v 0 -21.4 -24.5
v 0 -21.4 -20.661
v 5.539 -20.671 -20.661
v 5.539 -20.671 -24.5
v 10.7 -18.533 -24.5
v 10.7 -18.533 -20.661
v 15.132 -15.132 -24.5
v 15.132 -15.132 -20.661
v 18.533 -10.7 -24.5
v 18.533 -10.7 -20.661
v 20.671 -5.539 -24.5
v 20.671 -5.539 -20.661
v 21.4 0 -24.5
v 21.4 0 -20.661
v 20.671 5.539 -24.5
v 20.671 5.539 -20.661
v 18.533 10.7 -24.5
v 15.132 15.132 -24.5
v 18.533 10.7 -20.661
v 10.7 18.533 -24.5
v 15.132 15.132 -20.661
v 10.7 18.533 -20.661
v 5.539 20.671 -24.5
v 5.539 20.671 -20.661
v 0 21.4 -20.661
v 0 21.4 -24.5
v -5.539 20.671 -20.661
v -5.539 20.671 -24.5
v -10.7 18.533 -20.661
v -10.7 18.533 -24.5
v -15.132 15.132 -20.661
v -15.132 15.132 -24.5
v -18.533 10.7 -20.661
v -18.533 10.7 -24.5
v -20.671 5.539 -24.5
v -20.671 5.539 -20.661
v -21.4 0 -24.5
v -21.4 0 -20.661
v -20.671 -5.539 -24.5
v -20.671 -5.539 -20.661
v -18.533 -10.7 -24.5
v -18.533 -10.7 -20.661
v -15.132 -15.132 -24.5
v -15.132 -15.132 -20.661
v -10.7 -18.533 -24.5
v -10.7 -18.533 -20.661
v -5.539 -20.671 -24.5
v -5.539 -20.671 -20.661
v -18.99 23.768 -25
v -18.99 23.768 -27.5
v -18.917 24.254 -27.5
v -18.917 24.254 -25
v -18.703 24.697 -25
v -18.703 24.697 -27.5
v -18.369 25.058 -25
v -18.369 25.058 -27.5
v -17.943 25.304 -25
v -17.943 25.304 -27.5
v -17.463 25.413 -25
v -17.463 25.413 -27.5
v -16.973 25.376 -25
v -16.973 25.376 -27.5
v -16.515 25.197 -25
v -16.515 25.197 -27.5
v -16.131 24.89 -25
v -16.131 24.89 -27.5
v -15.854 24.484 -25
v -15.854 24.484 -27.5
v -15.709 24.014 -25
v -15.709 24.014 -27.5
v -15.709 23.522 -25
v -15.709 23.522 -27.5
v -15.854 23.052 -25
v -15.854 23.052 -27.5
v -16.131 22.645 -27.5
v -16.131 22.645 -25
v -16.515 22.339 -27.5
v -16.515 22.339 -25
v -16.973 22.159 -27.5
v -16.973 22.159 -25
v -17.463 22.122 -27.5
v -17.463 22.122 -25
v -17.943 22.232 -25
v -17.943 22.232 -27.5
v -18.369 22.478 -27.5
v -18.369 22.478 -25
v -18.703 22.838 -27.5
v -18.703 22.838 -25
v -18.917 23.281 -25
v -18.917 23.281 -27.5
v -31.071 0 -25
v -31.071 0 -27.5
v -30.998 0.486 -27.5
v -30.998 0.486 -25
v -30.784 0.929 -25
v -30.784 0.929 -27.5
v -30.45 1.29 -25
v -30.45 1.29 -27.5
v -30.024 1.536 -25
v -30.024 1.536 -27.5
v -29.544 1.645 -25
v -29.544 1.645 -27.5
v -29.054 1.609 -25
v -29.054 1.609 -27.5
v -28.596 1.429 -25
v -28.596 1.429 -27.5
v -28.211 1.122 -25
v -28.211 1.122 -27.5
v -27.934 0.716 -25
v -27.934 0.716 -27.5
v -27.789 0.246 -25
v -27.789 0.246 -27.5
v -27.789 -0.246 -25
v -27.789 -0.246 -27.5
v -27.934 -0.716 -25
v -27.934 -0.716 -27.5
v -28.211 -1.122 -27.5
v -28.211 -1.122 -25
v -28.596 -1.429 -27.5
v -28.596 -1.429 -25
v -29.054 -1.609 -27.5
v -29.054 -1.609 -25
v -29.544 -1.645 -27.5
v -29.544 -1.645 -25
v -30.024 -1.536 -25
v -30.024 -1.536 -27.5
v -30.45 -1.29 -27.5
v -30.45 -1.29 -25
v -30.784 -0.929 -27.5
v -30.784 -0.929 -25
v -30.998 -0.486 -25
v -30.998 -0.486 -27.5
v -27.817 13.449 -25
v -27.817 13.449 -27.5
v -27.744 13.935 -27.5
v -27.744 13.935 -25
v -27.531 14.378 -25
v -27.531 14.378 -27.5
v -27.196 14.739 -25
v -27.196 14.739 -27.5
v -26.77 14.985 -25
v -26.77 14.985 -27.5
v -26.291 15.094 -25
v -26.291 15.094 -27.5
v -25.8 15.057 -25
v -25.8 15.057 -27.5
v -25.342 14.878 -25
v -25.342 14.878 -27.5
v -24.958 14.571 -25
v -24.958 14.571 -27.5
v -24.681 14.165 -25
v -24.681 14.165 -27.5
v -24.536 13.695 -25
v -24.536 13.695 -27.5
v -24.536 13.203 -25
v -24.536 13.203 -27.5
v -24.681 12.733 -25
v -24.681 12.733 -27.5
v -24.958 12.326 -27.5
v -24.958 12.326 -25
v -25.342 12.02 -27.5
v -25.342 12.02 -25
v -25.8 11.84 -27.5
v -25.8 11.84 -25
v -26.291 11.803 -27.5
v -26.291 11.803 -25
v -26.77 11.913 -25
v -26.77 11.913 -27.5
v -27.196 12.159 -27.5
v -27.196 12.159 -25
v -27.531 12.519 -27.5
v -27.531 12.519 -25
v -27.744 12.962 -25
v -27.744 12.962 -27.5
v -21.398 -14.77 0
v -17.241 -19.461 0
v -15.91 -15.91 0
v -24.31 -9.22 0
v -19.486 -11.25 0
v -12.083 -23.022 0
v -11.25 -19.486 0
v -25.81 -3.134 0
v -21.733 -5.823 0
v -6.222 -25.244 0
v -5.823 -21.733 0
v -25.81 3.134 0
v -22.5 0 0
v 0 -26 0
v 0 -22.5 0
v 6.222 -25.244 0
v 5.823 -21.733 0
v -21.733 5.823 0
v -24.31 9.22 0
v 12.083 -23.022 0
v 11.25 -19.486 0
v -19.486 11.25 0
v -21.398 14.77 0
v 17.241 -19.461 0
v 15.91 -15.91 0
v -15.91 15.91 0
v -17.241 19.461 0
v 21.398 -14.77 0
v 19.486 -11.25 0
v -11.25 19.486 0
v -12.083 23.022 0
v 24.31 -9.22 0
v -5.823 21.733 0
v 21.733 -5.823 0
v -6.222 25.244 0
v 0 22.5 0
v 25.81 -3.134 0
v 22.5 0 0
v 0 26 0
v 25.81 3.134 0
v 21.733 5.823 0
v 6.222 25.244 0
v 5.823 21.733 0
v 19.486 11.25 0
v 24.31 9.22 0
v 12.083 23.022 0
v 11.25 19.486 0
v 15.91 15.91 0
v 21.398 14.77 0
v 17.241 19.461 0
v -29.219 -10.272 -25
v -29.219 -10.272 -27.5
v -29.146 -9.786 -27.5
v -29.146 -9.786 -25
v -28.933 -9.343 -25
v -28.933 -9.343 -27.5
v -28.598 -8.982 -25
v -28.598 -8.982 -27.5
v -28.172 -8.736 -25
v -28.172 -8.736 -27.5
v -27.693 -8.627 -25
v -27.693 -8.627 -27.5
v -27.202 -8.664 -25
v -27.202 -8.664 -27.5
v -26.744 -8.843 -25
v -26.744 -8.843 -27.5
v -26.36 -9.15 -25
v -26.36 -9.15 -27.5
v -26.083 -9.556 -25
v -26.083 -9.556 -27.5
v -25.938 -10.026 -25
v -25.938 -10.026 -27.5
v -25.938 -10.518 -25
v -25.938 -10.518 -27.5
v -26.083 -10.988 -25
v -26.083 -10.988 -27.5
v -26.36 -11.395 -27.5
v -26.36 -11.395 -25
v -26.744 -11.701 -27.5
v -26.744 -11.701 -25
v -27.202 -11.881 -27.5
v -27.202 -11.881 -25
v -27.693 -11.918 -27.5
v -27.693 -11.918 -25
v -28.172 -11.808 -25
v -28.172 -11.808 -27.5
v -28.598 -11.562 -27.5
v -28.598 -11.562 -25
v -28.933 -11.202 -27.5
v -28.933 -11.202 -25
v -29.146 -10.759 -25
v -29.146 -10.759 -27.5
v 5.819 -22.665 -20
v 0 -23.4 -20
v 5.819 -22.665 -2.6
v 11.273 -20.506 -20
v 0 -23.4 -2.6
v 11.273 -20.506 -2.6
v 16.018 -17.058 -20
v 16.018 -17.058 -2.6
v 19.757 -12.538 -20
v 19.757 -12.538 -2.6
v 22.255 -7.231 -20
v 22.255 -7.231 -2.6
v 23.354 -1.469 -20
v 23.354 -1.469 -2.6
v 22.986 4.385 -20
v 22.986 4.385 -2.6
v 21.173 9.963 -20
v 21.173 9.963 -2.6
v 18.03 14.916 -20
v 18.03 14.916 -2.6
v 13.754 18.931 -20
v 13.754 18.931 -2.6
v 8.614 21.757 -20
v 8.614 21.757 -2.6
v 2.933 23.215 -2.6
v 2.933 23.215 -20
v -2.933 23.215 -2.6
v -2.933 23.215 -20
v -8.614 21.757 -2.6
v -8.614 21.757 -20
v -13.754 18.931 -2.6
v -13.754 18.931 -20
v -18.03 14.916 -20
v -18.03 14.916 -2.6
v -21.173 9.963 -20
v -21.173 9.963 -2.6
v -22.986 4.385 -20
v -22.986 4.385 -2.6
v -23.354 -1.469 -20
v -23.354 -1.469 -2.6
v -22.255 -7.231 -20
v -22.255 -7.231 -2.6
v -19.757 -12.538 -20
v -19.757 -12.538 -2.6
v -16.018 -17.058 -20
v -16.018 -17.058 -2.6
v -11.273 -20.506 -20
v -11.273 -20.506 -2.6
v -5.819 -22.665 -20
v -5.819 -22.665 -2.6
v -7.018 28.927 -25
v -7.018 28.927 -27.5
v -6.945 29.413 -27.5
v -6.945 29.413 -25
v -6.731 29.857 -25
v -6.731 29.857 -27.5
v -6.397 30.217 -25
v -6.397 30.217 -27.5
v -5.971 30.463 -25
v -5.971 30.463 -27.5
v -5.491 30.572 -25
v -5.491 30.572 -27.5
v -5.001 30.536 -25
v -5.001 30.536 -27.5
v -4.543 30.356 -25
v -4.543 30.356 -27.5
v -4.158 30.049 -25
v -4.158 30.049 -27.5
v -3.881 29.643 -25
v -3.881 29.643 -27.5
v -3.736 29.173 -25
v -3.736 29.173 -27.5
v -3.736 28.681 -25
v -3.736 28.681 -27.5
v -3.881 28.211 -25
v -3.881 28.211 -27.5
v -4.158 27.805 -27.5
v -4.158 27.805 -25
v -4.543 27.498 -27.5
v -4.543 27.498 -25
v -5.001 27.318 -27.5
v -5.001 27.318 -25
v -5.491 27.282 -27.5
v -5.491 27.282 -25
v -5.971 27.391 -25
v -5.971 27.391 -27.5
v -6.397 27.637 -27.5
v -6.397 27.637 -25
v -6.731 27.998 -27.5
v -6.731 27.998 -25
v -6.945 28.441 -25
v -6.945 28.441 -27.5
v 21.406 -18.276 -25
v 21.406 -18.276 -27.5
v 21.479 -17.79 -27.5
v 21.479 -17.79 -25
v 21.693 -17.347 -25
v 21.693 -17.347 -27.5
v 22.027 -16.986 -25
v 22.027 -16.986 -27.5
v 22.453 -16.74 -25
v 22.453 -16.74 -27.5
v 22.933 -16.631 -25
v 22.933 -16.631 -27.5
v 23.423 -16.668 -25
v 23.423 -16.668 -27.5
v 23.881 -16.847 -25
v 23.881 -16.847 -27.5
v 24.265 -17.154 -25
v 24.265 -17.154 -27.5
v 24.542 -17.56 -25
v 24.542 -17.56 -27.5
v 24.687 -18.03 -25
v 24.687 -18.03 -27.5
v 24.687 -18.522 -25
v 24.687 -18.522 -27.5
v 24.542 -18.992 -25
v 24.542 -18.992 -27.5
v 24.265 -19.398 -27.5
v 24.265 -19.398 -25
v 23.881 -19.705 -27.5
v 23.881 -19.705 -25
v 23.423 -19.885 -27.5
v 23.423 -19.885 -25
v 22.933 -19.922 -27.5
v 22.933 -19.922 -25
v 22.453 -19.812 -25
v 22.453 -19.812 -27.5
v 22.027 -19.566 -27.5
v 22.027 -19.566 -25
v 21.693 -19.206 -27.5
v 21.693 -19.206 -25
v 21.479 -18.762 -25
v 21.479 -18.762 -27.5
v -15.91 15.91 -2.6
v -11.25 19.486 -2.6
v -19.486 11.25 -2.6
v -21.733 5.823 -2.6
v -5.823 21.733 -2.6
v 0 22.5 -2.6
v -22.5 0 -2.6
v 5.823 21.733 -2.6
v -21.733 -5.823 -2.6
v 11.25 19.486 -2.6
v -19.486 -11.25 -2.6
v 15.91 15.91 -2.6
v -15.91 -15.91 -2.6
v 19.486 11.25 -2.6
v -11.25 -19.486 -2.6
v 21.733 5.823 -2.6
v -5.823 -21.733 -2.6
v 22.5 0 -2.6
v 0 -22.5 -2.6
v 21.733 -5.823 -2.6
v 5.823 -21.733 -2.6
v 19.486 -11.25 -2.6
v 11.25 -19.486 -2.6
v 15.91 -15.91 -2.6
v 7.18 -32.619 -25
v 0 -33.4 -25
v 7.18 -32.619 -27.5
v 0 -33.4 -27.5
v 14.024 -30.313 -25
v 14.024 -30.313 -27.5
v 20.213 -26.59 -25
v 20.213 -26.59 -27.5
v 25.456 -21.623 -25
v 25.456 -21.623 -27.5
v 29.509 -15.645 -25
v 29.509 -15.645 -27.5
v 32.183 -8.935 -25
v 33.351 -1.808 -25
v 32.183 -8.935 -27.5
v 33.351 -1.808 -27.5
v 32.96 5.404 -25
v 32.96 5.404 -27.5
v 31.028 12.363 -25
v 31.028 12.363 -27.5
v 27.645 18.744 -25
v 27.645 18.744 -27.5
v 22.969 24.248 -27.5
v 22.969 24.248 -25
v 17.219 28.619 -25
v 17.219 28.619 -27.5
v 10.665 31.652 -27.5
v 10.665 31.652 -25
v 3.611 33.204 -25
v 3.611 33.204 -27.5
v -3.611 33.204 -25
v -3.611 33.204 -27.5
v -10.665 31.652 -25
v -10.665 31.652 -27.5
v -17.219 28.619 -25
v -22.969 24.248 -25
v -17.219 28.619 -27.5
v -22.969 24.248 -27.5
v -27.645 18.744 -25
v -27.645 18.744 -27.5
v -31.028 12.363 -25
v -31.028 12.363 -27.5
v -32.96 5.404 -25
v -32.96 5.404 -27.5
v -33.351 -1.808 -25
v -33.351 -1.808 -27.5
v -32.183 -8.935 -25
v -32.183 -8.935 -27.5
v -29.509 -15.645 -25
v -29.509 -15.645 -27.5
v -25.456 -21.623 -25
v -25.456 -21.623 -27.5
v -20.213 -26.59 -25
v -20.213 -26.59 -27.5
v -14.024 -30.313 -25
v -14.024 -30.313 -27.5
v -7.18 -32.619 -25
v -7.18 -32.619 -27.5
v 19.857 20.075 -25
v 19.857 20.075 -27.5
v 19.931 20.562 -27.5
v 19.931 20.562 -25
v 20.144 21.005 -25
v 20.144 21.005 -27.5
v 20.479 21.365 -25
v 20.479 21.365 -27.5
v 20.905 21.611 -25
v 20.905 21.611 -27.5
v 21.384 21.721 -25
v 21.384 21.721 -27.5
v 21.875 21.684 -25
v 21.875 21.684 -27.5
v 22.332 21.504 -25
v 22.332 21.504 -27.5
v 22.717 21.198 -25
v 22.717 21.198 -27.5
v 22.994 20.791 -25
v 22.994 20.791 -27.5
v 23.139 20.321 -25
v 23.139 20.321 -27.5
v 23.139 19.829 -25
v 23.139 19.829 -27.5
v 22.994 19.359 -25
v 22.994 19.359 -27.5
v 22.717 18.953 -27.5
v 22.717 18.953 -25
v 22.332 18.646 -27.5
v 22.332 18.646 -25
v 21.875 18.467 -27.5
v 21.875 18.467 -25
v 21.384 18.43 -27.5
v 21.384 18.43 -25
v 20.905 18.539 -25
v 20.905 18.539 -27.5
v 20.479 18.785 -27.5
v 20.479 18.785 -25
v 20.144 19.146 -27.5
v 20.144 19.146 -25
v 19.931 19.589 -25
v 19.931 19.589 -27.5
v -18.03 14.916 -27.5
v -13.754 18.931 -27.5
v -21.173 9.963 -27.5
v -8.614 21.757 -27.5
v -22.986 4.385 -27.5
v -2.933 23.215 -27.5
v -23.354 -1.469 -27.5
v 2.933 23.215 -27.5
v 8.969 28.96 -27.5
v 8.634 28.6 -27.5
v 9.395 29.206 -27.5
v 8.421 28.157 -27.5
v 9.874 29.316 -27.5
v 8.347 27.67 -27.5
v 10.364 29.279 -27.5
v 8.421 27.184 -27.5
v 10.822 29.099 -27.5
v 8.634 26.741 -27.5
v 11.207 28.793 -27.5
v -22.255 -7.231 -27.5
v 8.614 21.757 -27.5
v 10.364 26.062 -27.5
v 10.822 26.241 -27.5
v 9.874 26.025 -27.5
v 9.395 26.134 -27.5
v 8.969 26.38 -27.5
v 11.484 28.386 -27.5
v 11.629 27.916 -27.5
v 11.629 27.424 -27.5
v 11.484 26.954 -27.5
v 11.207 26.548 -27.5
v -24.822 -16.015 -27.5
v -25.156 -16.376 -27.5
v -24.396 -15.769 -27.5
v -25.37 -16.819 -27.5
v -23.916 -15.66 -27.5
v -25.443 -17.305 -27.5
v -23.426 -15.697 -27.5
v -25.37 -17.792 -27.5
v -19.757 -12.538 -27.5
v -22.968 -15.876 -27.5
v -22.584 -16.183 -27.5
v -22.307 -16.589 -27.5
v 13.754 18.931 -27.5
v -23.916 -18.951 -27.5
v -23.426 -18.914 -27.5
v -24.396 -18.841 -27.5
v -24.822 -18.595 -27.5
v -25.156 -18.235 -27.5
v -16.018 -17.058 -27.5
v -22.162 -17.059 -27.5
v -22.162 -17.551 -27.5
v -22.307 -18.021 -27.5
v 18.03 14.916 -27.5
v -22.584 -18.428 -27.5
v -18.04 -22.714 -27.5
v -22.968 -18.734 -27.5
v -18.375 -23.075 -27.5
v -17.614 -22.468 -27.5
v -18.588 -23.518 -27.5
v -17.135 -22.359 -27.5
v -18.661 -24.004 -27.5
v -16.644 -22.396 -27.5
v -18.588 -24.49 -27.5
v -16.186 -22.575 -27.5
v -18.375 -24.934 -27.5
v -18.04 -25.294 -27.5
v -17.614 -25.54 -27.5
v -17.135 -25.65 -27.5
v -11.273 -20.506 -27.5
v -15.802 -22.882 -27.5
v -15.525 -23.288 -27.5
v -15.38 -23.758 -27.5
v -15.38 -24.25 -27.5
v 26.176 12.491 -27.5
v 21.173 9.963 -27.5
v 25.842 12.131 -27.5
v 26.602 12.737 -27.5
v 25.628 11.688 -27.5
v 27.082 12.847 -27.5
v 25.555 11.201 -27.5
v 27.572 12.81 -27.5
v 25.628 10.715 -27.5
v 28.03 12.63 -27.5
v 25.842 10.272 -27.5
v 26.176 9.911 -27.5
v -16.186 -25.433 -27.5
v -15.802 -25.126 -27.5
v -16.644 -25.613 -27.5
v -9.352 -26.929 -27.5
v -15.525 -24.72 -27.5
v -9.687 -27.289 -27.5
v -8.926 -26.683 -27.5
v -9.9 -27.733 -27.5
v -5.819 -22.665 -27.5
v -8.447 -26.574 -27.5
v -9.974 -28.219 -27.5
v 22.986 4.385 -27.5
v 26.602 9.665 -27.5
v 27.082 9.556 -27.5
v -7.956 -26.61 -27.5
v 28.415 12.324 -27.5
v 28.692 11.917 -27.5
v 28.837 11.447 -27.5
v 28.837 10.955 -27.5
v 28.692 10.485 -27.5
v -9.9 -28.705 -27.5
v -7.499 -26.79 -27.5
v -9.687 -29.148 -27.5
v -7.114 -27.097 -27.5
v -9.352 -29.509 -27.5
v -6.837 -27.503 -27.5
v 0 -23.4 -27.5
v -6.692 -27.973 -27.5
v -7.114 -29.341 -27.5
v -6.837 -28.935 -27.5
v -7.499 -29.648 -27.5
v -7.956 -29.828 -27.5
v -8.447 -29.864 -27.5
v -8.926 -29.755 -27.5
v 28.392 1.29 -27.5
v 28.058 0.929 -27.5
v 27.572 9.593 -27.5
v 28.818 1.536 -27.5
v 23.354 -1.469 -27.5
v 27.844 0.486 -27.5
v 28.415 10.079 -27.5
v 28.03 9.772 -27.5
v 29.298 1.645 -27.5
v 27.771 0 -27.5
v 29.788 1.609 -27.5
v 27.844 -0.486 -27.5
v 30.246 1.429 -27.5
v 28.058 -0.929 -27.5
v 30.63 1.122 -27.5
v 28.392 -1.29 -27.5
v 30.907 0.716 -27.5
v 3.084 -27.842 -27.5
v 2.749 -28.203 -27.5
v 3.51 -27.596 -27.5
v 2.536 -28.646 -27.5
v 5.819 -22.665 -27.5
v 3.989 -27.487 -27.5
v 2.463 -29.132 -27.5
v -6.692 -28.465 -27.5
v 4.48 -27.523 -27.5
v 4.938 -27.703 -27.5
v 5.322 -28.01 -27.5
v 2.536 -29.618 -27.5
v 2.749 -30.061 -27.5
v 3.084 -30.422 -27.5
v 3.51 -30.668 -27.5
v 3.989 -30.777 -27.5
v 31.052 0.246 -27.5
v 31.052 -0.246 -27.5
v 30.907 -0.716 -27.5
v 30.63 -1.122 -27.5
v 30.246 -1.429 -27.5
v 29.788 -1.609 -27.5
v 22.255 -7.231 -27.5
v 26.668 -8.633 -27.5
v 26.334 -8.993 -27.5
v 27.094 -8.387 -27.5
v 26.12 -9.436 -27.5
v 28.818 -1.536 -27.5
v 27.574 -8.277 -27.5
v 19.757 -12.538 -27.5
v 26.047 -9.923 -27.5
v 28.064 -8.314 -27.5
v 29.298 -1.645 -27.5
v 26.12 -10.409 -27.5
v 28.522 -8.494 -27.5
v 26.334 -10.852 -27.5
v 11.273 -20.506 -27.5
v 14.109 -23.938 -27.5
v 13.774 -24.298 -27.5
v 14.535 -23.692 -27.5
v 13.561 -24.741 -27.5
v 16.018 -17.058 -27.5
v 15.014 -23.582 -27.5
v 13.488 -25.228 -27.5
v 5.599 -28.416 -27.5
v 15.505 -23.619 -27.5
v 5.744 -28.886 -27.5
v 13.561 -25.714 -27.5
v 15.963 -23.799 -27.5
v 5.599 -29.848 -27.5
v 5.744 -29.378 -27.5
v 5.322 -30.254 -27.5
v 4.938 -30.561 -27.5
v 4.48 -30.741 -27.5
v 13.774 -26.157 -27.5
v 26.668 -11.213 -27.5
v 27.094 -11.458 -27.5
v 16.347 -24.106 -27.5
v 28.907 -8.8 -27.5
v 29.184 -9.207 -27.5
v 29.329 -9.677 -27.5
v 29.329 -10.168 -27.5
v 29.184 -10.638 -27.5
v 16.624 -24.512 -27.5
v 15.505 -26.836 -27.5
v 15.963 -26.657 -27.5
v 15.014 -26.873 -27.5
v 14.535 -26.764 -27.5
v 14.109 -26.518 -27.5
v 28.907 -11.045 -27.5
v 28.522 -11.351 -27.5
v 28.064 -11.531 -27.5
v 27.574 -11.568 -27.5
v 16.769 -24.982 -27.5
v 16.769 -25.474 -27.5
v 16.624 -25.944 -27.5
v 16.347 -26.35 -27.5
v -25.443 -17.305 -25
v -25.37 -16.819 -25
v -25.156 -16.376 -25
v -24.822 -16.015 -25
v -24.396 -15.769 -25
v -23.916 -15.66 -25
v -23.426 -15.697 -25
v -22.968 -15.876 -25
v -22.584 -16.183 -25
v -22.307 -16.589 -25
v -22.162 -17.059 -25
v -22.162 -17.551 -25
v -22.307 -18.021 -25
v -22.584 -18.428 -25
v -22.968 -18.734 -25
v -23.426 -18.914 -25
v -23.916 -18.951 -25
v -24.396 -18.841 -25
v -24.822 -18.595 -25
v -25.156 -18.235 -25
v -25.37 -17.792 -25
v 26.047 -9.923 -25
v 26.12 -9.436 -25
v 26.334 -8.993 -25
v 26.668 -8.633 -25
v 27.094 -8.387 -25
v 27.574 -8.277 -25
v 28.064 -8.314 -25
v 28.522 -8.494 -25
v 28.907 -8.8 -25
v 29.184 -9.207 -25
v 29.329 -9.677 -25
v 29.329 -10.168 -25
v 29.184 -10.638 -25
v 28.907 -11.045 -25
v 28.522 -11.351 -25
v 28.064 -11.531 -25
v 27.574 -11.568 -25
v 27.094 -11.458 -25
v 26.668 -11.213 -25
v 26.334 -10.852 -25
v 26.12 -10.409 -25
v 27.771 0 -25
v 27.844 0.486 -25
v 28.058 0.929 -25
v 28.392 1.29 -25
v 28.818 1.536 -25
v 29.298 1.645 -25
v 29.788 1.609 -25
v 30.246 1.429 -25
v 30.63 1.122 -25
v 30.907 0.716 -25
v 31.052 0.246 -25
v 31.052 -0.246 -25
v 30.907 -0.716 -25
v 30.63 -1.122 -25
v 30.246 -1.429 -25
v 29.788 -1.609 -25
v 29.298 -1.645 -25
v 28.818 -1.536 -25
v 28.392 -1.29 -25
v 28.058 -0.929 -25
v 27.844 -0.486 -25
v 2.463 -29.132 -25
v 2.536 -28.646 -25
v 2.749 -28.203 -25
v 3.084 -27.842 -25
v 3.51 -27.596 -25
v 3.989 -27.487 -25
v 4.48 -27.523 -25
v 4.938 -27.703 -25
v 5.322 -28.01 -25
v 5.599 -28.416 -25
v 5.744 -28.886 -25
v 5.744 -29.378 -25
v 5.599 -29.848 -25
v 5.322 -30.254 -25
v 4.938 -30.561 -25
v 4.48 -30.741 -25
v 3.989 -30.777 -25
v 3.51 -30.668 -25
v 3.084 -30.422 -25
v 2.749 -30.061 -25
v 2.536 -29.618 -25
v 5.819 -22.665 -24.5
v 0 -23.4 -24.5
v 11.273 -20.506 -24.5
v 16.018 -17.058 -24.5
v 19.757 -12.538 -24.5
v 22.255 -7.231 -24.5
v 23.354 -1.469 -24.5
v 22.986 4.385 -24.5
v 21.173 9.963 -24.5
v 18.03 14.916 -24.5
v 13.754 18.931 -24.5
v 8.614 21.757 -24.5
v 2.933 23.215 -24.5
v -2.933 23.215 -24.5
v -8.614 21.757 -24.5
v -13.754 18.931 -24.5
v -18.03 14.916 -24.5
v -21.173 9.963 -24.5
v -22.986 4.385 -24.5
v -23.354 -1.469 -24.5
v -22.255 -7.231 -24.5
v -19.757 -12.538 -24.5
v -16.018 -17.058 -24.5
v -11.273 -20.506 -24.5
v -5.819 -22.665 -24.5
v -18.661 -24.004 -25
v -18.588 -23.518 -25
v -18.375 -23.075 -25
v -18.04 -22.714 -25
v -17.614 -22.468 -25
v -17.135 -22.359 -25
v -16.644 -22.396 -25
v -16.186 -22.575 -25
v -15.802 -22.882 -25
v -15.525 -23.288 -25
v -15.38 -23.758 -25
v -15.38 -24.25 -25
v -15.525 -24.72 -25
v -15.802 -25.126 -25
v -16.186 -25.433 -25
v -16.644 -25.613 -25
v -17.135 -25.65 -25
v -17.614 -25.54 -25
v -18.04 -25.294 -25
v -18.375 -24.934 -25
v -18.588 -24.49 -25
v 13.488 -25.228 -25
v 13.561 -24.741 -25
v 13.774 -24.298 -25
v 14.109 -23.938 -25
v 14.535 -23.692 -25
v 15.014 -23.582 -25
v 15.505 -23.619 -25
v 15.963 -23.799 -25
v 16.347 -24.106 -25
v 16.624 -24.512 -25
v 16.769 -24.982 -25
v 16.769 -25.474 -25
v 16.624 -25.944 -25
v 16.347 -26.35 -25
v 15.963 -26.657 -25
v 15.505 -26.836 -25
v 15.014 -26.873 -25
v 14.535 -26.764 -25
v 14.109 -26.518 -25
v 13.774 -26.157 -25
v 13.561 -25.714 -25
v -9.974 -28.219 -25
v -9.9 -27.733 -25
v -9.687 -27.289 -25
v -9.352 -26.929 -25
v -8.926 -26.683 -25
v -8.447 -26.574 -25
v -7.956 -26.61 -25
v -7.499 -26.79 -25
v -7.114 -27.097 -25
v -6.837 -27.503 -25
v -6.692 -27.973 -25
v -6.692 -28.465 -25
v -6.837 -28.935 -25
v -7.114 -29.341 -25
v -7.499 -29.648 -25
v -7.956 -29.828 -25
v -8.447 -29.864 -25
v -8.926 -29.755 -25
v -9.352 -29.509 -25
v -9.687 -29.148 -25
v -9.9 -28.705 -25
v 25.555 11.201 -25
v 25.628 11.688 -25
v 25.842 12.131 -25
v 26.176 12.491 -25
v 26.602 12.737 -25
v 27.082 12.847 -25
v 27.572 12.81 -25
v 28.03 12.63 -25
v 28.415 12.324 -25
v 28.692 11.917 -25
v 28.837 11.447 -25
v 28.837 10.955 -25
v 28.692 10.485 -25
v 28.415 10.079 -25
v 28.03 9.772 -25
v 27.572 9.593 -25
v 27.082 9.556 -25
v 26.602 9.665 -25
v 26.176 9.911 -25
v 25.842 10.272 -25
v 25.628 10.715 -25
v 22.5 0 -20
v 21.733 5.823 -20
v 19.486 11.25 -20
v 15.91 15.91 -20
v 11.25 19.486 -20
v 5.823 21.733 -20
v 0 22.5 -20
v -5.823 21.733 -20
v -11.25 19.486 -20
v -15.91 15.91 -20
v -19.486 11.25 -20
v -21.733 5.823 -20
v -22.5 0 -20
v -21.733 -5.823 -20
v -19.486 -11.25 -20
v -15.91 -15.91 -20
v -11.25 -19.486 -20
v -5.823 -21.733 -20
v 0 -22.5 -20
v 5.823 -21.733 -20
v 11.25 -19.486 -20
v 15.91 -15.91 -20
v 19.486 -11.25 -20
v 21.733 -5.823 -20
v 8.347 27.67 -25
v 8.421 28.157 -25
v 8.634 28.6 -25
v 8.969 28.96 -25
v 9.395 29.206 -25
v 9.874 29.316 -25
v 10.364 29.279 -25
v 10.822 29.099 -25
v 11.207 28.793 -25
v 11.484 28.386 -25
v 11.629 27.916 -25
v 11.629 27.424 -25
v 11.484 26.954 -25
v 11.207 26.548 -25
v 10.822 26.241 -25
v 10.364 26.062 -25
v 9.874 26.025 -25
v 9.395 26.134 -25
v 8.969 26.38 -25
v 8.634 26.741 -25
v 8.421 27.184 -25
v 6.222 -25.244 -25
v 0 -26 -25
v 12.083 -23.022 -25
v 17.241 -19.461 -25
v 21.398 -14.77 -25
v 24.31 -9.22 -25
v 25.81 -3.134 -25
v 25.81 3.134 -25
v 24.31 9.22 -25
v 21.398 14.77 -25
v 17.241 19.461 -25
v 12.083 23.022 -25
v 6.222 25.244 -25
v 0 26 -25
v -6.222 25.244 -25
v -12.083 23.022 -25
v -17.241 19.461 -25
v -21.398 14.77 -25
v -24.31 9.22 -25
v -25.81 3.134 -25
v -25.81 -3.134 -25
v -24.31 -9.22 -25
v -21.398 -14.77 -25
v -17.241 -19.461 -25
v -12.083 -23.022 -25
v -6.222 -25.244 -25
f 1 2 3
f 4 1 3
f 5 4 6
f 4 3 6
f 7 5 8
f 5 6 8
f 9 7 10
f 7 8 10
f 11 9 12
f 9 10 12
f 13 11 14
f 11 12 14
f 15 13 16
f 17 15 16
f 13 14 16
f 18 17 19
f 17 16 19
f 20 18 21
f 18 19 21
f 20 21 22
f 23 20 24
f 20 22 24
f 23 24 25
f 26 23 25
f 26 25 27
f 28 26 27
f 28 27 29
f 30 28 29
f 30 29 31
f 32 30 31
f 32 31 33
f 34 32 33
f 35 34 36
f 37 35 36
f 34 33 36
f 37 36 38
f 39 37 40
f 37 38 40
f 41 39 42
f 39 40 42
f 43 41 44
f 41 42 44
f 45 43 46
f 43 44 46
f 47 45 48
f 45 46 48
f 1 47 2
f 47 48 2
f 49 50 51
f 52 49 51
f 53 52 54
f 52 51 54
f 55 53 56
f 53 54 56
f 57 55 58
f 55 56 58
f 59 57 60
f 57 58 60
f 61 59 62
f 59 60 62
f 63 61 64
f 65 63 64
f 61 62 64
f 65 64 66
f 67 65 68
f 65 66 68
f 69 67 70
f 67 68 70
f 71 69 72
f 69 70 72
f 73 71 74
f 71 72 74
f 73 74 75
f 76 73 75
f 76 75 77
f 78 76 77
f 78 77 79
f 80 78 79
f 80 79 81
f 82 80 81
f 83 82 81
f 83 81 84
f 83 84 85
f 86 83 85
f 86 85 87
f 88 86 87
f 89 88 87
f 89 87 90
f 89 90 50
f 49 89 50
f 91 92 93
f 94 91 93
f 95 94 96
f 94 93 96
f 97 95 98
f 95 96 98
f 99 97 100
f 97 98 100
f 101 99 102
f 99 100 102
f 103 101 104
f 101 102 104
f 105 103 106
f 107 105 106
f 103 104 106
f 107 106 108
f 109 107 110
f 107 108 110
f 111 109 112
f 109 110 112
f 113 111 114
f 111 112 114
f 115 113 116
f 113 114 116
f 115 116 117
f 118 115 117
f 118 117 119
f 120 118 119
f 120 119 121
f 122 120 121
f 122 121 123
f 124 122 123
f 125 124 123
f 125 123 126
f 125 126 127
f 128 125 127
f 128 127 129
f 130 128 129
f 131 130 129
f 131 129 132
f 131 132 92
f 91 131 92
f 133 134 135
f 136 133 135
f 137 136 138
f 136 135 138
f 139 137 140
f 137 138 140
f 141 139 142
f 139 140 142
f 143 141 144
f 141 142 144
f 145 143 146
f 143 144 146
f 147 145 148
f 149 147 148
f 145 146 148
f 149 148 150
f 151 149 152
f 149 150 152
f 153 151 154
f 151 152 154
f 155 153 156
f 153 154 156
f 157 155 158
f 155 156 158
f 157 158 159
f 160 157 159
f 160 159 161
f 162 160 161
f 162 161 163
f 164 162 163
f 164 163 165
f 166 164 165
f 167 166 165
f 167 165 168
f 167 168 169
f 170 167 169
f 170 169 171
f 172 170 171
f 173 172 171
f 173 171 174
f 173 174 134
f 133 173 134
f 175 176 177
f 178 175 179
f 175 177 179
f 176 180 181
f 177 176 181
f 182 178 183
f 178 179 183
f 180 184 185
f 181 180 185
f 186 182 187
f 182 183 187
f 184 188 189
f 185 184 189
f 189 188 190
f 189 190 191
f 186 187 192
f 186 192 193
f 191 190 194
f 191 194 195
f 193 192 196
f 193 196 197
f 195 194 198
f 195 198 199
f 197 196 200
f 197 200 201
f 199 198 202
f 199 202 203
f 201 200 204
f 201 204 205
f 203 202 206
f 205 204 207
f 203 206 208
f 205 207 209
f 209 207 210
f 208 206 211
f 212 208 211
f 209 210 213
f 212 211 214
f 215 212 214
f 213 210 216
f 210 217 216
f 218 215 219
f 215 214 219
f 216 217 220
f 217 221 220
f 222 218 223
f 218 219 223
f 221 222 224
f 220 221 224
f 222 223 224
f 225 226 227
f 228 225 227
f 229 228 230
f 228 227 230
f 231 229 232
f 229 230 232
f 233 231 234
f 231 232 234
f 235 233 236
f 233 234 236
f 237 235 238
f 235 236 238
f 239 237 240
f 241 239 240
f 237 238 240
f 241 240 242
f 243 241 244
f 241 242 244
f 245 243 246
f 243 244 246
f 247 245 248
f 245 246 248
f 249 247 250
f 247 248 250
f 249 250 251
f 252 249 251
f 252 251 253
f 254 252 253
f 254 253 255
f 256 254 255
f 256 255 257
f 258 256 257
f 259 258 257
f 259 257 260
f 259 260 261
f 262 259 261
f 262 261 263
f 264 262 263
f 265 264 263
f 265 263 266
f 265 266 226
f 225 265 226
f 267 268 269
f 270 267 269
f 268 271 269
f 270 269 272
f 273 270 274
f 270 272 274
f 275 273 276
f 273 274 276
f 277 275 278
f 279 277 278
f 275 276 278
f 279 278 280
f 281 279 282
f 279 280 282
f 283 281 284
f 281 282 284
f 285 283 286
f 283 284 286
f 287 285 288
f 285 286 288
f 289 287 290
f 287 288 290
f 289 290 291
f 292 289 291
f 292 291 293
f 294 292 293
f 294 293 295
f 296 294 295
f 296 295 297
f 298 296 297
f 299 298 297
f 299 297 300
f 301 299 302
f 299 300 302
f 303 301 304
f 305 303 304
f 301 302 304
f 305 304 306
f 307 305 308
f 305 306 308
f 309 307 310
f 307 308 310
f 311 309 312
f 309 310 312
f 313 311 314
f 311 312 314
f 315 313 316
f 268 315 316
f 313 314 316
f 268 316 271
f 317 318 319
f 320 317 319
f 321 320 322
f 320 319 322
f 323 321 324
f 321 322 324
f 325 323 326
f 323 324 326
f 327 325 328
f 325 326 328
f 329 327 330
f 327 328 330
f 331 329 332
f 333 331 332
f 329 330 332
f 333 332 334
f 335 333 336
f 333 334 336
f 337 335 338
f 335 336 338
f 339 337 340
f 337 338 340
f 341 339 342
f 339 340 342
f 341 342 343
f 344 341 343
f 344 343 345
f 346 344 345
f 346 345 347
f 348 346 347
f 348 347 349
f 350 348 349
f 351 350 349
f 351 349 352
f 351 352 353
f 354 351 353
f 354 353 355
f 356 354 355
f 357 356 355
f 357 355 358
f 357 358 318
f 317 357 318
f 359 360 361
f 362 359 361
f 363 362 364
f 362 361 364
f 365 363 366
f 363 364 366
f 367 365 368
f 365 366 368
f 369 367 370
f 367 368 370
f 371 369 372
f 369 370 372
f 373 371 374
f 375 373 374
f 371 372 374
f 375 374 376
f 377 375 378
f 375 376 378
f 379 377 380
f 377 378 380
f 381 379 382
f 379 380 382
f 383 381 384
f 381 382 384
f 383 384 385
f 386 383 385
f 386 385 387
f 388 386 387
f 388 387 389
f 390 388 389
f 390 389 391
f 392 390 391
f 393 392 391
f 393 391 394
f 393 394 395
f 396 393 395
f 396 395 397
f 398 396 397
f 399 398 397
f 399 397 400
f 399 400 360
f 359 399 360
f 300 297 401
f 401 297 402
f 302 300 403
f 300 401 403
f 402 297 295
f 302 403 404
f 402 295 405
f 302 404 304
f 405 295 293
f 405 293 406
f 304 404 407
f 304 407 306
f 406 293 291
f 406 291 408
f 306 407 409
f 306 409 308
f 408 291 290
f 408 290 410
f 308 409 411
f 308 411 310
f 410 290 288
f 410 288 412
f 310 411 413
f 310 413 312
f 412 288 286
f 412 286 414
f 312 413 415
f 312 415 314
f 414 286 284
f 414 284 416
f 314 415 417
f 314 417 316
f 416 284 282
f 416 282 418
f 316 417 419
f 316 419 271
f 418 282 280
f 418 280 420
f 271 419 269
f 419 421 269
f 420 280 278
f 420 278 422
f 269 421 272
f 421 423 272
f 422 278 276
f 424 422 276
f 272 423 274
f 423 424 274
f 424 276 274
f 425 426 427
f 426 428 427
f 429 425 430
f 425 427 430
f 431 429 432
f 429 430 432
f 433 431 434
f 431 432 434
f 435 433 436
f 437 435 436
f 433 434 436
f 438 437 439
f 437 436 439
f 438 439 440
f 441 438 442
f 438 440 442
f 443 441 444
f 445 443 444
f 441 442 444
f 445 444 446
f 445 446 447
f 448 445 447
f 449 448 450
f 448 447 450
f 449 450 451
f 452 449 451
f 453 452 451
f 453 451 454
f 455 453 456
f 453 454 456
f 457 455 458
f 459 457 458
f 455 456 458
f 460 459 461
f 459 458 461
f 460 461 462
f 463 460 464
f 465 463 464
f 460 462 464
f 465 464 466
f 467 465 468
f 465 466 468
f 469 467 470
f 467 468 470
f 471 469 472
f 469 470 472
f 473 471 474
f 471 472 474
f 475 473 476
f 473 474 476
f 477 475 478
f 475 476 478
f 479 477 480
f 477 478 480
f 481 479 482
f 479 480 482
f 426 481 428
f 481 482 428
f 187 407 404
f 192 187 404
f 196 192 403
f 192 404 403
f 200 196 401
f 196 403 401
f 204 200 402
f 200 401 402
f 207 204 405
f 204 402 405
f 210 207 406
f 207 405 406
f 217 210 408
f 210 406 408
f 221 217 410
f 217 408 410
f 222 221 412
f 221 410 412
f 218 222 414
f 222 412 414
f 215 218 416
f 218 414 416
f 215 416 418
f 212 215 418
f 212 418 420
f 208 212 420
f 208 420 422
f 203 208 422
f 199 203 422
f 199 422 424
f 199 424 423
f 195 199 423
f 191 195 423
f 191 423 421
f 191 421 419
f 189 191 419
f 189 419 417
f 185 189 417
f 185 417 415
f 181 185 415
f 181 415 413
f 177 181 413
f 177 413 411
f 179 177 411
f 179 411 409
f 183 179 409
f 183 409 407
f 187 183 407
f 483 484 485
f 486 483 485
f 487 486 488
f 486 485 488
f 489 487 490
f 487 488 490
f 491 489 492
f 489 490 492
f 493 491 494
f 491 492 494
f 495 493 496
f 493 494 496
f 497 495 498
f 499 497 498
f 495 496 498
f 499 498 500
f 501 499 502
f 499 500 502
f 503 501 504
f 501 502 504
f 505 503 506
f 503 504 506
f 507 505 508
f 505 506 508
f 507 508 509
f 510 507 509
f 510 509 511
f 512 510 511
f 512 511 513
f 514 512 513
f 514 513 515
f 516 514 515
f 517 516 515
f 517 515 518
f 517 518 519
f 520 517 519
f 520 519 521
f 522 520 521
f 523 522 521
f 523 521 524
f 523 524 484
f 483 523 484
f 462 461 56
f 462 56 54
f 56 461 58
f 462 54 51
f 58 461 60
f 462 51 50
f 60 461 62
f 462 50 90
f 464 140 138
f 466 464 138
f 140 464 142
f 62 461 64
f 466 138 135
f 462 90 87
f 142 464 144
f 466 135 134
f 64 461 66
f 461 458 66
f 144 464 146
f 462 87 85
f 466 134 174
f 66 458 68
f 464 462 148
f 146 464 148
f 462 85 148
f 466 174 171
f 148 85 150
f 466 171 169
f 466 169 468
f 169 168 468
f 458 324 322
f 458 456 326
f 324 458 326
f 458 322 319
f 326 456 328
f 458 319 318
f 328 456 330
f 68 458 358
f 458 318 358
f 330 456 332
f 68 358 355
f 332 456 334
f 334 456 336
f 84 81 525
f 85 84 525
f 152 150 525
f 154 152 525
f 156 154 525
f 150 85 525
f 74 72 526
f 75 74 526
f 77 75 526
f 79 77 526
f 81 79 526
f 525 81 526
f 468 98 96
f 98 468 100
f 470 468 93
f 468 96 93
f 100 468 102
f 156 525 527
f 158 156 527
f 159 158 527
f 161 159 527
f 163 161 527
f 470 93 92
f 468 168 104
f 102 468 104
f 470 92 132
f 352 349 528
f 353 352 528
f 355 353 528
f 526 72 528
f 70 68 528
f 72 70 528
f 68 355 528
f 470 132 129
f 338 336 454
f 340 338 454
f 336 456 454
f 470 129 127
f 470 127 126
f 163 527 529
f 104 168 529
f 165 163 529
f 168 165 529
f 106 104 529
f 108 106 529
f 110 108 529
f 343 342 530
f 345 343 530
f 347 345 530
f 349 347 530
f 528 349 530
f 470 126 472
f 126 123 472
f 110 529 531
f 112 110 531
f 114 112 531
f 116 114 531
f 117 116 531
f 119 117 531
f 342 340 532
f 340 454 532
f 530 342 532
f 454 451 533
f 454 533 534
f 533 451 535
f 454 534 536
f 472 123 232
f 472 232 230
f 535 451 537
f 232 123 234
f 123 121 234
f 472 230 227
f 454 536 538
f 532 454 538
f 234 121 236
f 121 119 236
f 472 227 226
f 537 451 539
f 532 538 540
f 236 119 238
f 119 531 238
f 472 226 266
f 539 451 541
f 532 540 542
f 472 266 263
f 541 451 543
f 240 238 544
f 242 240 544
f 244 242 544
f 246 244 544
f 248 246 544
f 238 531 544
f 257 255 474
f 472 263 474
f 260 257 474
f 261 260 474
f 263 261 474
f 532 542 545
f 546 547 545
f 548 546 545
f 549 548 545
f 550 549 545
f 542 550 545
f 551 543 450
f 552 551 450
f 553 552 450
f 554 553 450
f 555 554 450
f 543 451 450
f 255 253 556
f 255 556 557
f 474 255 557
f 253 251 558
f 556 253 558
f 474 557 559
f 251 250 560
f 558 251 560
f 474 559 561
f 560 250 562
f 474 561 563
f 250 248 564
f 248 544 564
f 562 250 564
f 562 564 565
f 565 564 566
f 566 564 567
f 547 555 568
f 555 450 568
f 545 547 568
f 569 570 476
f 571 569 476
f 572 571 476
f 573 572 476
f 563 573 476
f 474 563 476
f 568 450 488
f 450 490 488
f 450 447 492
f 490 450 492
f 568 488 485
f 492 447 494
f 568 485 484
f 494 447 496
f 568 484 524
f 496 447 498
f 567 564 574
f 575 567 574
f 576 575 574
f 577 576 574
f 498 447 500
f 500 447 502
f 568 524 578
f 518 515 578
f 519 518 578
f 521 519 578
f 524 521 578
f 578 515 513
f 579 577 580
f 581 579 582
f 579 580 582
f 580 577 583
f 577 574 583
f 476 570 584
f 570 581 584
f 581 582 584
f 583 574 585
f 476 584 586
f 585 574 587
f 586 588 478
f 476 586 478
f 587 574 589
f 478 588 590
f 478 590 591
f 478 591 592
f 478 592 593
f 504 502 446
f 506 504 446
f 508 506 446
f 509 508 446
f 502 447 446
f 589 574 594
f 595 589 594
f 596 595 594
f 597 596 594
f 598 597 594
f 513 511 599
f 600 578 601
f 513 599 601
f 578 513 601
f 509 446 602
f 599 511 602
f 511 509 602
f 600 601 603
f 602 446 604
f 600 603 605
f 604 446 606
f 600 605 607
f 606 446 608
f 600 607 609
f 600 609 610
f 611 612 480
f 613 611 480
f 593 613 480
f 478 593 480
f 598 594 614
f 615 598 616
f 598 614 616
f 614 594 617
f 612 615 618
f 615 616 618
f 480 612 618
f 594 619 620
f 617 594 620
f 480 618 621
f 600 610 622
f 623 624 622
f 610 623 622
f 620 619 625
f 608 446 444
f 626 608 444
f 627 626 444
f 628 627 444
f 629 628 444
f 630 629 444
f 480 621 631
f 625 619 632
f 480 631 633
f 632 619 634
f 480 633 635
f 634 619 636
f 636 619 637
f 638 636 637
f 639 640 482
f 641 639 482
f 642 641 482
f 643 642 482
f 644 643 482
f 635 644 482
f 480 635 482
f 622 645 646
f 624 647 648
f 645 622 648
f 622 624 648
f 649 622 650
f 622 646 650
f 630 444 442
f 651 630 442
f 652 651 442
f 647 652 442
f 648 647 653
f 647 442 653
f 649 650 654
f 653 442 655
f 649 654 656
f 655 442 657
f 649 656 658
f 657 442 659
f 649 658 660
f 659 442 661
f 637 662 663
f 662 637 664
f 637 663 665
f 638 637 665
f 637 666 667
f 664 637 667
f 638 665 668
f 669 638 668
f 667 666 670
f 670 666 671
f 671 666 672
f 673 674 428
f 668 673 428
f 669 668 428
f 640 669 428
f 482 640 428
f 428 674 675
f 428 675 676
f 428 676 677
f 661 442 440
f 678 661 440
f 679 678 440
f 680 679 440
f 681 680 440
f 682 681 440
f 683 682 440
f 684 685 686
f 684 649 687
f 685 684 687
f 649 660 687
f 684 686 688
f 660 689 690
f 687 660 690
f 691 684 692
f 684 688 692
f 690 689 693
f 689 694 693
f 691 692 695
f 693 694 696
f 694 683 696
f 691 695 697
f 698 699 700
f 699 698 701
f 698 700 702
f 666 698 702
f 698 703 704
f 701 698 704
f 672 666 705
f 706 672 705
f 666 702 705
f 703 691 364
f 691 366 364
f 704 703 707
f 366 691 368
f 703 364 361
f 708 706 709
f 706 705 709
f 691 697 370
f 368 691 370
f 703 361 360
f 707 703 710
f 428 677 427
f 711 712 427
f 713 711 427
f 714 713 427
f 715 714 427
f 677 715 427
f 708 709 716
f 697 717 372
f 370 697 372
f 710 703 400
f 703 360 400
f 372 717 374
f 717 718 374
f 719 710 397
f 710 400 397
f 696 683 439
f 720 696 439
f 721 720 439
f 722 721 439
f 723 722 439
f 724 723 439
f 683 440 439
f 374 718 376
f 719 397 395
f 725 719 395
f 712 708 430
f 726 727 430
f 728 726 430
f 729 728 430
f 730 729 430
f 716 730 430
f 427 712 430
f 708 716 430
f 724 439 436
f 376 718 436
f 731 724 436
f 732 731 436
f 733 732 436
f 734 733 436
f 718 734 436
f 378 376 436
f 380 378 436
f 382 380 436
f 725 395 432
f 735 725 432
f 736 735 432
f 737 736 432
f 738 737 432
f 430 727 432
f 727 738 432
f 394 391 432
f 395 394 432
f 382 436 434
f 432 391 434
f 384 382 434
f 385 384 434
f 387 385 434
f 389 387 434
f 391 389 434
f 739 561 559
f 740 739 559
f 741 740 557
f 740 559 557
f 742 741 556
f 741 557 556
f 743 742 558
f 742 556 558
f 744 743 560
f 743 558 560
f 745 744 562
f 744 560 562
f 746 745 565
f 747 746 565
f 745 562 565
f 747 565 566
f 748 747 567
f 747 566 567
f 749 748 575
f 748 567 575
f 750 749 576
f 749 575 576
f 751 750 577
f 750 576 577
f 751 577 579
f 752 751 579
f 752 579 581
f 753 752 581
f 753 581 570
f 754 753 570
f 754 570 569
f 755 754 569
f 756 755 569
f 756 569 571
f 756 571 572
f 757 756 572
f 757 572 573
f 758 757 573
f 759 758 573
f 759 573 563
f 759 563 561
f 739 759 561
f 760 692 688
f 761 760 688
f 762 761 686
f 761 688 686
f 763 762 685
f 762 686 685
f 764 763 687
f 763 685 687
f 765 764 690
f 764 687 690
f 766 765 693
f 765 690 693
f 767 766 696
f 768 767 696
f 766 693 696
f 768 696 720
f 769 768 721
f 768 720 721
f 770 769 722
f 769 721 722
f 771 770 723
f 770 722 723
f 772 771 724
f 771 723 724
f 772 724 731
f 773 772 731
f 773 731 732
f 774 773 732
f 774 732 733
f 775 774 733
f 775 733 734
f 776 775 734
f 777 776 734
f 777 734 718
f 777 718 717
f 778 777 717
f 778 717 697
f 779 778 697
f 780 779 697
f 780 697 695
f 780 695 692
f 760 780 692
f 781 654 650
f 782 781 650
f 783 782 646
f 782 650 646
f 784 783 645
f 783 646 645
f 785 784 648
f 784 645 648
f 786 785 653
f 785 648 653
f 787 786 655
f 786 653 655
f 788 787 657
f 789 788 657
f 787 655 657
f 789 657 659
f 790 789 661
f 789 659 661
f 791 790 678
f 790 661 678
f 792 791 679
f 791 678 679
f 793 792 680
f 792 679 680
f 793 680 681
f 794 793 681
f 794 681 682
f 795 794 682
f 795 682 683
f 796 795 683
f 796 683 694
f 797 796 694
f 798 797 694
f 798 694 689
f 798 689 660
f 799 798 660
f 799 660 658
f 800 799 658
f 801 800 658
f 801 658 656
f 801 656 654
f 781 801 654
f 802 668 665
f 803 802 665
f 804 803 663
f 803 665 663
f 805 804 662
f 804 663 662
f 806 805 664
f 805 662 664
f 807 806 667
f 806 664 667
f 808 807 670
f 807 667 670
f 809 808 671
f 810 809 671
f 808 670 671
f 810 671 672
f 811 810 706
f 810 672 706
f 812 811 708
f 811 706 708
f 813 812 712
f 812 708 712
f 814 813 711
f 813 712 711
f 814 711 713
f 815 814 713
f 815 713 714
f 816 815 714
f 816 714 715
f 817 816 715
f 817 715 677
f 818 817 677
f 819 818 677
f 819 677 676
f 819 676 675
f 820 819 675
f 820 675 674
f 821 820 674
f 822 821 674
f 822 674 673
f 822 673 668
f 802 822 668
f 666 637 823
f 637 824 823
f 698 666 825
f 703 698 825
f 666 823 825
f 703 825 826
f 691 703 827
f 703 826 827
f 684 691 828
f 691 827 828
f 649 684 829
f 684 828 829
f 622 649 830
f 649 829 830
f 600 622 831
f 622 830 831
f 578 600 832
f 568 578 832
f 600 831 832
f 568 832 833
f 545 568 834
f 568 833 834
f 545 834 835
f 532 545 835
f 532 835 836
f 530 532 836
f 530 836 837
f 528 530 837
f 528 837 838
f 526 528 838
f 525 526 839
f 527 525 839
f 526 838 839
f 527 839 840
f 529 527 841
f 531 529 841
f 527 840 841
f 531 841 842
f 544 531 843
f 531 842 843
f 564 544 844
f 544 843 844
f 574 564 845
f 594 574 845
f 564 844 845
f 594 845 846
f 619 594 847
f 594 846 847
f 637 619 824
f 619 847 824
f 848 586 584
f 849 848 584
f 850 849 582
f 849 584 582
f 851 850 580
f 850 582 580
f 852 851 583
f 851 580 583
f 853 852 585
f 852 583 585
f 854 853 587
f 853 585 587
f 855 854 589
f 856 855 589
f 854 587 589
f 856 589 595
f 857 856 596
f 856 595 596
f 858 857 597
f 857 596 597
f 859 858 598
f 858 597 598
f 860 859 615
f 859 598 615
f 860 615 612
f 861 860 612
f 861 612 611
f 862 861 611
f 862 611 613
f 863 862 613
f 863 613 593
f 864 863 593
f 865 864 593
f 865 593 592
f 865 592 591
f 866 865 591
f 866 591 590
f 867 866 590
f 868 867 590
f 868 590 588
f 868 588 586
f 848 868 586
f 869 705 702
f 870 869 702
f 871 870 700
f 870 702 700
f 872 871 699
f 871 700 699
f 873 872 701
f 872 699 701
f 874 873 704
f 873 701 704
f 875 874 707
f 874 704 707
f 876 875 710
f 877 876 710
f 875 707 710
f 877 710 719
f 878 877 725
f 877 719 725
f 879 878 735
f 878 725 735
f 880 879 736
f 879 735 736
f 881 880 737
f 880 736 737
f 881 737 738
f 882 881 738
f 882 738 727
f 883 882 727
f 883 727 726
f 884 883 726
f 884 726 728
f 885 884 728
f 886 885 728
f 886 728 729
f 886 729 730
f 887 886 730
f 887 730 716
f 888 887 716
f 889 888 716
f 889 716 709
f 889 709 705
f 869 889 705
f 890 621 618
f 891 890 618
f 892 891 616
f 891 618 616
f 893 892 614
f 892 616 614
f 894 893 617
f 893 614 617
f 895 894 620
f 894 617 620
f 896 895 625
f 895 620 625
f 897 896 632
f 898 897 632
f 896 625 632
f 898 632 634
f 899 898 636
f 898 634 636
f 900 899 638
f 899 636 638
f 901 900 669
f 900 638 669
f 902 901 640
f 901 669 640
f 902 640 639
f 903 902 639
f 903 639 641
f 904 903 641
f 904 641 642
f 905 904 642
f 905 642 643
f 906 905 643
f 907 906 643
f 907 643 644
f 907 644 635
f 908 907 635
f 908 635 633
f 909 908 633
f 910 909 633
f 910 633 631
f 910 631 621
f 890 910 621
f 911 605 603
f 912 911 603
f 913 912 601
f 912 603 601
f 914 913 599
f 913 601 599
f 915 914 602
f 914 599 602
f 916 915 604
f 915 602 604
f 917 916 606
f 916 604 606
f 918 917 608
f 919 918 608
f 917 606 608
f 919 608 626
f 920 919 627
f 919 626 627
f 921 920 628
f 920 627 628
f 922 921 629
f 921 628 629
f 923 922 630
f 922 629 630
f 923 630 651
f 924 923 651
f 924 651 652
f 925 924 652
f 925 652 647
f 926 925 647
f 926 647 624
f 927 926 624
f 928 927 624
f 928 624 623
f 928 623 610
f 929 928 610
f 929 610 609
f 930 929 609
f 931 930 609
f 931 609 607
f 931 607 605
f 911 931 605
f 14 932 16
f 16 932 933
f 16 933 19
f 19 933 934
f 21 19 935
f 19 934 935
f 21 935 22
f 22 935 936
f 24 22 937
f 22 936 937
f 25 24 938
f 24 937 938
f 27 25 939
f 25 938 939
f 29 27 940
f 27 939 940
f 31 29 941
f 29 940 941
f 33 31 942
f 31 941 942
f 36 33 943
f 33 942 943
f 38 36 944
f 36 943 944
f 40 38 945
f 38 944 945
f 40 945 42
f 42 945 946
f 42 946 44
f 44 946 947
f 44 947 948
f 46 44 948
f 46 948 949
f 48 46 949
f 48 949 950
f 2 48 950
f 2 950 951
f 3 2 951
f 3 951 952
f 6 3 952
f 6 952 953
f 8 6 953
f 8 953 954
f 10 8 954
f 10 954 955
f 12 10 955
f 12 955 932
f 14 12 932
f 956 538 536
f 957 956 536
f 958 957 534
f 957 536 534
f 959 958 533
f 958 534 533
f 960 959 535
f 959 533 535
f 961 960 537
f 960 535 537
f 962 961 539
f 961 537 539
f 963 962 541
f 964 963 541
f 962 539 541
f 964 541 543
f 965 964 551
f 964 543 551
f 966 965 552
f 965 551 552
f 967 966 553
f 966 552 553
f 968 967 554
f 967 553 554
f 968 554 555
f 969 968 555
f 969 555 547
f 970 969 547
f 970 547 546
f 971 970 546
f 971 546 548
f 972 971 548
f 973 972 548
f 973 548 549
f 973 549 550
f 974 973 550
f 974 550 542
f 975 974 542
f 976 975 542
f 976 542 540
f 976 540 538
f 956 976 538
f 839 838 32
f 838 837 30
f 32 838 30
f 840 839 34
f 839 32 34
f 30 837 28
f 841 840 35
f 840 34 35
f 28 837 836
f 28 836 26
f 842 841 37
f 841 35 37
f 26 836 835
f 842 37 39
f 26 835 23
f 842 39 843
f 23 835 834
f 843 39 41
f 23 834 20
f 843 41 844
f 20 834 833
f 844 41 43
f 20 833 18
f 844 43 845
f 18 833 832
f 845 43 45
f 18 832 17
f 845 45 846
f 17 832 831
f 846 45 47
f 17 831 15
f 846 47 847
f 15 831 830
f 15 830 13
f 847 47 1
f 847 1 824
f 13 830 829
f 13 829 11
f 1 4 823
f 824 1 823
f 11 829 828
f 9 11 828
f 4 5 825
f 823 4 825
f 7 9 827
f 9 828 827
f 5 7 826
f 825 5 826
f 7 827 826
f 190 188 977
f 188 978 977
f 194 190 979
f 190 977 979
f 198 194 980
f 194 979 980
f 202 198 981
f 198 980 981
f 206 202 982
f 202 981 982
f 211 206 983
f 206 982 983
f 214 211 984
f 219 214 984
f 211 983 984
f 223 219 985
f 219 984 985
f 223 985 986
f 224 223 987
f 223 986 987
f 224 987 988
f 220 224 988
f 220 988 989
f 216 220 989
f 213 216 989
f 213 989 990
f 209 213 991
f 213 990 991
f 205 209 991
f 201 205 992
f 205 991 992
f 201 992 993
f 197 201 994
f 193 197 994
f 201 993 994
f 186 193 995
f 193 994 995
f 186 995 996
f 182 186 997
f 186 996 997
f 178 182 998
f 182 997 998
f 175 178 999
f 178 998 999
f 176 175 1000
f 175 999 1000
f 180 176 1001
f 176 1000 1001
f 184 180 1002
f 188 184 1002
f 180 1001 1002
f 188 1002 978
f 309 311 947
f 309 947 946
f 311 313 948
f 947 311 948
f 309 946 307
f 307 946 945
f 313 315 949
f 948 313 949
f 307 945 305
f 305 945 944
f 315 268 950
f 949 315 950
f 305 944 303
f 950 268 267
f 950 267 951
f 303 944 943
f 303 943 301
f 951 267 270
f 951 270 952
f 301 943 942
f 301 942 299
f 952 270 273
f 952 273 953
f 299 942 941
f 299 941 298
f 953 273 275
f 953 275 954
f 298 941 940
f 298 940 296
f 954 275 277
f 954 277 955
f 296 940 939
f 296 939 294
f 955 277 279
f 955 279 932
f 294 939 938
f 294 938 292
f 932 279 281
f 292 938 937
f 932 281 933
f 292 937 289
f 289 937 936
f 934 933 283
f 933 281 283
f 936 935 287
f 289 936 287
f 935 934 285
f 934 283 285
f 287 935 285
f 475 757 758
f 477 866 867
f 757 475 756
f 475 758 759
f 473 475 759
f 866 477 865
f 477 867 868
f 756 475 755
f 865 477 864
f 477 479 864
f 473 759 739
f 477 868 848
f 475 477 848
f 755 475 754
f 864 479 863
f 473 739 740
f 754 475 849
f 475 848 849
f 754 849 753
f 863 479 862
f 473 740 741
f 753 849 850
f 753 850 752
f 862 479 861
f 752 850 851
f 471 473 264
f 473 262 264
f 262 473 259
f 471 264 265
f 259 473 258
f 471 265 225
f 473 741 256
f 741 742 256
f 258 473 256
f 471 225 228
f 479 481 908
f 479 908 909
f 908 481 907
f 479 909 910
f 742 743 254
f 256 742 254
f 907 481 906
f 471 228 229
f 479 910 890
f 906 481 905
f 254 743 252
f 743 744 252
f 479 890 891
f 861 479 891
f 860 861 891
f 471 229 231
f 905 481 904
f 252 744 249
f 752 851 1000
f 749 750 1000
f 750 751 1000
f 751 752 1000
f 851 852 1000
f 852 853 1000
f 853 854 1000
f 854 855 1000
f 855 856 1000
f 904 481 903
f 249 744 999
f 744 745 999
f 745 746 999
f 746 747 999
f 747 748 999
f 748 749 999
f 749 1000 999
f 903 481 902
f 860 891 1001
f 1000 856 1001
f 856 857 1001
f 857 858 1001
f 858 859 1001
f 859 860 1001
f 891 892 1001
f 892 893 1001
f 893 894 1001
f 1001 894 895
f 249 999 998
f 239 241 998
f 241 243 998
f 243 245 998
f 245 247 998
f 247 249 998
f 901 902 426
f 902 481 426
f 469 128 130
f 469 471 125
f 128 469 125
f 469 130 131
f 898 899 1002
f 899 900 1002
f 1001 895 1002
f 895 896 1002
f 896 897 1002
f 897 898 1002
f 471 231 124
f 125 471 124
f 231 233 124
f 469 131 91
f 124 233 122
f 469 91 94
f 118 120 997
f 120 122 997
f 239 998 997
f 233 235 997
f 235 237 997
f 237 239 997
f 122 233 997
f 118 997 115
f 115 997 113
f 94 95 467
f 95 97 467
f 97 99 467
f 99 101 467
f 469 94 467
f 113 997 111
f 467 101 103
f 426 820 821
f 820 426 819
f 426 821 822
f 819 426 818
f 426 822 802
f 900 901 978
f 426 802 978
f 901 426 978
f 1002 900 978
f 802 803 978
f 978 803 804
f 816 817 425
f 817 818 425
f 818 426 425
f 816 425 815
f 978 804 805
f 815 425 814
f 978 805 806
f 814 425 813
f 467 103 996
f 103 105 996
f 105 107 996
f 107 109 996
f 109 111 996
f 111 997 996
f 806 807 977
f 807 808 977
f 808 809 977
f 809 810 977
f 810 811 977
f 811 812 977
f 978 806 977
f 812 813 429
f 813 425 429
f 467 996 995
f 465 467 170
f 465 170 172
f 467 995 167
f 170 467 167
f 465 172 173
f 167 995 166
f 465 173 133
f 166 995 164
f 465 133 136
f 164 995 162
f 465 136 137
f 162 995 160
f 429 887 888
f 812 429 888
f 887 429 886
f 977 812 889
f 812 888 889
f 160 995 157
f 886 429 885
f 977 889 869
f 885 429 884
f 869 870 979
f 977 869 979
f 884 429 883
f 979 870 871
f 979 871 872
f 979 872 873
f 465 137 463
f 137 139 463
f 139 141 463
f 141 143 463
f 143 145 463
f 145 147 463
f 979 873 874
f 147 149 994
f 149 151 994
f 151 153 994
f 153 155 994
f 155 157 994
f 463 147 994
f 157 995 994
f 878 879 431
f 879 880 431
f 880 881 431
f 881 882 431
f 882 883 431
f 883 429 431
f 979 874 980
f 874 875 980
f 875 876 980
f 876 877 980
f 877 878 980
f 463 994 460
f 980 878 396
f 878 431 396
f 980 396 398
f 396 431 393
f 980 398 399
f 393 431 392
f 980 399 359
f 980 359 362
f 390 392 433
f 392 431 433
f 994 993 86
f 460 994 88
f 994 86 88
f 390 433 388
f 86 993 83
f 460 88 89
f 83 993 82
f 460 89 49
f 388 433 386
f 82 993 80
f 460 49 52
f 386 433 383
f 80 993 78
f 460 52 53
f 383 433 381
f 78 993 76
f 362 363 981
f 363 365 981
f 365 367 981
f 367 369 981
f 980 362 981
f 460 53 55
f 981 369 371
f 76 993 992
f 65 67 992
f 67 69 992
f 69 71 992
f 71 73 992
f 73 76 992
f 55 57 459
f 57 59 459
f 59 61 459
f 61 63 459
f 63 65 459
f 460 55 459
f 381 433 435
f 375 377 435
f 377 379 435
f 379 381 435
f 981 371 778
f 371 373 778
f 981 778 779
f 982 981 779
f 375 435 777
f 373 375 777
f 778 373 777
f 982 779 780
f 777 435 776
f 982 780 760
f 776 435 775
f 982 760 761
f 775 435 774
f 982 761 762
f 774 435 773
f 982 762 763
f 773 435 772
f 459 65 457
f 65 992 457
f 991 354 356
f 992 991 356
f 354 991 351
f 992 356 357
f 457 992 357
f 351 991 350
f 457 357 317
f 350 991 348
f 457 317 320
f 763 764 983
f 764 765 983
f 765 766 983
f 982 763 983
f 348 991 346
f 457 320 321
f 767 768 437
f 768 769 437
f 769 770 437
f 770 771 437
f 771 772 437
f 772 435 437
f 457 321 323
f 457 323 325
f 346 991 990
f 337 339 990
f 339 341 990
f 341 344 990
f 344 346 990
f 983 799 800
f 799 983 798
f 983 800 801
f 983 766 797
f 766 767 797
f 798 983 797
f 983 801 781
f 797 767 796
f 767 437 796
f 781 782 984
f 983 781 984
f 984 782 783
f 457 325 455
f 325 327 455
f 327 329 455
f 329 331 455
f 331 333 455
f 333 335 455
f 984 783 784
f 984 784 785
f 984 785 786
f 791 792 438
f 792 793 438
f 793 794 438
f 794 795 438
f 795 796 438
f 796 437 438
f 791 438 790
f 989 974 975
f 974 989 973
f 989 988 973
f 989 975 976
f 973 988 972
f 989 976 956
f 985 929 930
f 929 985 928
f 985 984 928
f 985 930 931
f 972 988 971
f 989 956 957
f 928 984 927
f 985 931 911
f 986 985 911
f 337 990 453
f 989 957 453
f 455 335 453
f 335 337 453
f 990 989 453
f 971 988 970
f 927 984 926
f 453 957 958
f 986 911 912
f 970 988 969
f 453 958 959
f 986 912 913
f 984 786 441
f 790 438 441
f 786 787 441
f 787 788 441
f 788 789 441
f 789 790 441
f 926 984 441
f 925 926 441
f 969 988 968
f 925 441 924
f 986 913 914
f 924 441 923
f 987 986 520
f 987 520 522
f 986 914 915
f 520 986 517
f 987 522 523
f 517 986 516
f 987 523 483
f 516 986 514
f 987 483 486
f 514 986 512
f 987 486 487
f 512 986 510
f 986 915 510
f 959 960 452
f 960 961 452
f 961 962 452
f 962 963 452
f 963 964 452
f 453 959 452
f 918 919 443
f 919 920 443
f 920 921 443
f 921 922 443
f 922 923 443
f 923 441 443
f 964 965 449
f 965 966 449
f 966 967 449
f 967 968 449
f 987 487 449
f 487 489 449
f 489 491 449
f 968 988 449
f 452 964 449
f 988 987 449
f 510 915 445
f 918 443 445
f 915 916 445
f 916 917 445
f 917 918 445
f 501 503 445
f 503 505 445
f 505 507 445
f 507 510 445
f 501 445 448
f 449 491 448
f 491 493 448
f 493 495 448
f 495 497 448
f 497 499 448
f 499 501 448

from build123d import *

# Parameters (mm, degrees)
F3_D     = 45
F3_DEPTH = 20
F3_TIP   = 13.5193639281
F5_D     = 3.3
F5_DEPTH = 20
F5_TIP   = 0.9914200214


with BuildPart() as f1:
    # F0 (on Right) → F1 (revolve)
    with BuildSketch(Plane.YZ):
        Polygon((0, -2.6000006461), (0, 0), (-26, 0), (-26, -25), (-33.4, -25), (-33.4, -27.5), (-23.4, -27.5), (-23.4, -24.5), (-21.4, -24.5), (-21.4, -20), (-23.4, -20), (-23.4, -2.6000006461), align=None)
    revolve(axis=Axis((0, 0, -1.300000323), (0, 0, 1)))

    # F3
    with Locations(Plane.XY):
        with Locations((0, 0)):
            Hole(F3_D / 2, depth=F3_DEPTH)
            with Locations((0, 0, -(F3_DEPTH + F3_TIP / 2))):  # 118° drill point
                Cone(0, F3_D / 2, F3_TIP, mode=Mode.SUBTRACT)

    # F5
    with Locations(Plane.XY.offset(-25)):
        with Locations((-26.1672226652, 13.4486109676), (-17.3401695769, 23.7677764633), (-5.3680126756, 28.9270309378), (9.997338267, 27.6702350286), (21.5074325556, 20.0753337165), (27.2051514467, 11.2012683982), (29.4208884802, 0), (27.6971504759, -9.9225266177), (23.0558330823, -18.2761385376), (15.1375992814, -25.2277975051), (4.1127317731, -29.1320118826), (-8.323613721, -28.2188967465), (-17.0114493372, -24.0041511079), (-23.7931689823, -17.3053109983), (-29.4208884802, 0), (-27.5693241627, -10.2723436556)):
            Hole(F5_D / 2, depth=F5_DEPTH)
            with Locations((0, 0, -(F5_DEPTH + F5_TIP / 2))):  # 118° drill point
                Cone(0, F5_D / 2, F5_TIP, mode=Mode.SUBTRACT)


solid = f1.part
